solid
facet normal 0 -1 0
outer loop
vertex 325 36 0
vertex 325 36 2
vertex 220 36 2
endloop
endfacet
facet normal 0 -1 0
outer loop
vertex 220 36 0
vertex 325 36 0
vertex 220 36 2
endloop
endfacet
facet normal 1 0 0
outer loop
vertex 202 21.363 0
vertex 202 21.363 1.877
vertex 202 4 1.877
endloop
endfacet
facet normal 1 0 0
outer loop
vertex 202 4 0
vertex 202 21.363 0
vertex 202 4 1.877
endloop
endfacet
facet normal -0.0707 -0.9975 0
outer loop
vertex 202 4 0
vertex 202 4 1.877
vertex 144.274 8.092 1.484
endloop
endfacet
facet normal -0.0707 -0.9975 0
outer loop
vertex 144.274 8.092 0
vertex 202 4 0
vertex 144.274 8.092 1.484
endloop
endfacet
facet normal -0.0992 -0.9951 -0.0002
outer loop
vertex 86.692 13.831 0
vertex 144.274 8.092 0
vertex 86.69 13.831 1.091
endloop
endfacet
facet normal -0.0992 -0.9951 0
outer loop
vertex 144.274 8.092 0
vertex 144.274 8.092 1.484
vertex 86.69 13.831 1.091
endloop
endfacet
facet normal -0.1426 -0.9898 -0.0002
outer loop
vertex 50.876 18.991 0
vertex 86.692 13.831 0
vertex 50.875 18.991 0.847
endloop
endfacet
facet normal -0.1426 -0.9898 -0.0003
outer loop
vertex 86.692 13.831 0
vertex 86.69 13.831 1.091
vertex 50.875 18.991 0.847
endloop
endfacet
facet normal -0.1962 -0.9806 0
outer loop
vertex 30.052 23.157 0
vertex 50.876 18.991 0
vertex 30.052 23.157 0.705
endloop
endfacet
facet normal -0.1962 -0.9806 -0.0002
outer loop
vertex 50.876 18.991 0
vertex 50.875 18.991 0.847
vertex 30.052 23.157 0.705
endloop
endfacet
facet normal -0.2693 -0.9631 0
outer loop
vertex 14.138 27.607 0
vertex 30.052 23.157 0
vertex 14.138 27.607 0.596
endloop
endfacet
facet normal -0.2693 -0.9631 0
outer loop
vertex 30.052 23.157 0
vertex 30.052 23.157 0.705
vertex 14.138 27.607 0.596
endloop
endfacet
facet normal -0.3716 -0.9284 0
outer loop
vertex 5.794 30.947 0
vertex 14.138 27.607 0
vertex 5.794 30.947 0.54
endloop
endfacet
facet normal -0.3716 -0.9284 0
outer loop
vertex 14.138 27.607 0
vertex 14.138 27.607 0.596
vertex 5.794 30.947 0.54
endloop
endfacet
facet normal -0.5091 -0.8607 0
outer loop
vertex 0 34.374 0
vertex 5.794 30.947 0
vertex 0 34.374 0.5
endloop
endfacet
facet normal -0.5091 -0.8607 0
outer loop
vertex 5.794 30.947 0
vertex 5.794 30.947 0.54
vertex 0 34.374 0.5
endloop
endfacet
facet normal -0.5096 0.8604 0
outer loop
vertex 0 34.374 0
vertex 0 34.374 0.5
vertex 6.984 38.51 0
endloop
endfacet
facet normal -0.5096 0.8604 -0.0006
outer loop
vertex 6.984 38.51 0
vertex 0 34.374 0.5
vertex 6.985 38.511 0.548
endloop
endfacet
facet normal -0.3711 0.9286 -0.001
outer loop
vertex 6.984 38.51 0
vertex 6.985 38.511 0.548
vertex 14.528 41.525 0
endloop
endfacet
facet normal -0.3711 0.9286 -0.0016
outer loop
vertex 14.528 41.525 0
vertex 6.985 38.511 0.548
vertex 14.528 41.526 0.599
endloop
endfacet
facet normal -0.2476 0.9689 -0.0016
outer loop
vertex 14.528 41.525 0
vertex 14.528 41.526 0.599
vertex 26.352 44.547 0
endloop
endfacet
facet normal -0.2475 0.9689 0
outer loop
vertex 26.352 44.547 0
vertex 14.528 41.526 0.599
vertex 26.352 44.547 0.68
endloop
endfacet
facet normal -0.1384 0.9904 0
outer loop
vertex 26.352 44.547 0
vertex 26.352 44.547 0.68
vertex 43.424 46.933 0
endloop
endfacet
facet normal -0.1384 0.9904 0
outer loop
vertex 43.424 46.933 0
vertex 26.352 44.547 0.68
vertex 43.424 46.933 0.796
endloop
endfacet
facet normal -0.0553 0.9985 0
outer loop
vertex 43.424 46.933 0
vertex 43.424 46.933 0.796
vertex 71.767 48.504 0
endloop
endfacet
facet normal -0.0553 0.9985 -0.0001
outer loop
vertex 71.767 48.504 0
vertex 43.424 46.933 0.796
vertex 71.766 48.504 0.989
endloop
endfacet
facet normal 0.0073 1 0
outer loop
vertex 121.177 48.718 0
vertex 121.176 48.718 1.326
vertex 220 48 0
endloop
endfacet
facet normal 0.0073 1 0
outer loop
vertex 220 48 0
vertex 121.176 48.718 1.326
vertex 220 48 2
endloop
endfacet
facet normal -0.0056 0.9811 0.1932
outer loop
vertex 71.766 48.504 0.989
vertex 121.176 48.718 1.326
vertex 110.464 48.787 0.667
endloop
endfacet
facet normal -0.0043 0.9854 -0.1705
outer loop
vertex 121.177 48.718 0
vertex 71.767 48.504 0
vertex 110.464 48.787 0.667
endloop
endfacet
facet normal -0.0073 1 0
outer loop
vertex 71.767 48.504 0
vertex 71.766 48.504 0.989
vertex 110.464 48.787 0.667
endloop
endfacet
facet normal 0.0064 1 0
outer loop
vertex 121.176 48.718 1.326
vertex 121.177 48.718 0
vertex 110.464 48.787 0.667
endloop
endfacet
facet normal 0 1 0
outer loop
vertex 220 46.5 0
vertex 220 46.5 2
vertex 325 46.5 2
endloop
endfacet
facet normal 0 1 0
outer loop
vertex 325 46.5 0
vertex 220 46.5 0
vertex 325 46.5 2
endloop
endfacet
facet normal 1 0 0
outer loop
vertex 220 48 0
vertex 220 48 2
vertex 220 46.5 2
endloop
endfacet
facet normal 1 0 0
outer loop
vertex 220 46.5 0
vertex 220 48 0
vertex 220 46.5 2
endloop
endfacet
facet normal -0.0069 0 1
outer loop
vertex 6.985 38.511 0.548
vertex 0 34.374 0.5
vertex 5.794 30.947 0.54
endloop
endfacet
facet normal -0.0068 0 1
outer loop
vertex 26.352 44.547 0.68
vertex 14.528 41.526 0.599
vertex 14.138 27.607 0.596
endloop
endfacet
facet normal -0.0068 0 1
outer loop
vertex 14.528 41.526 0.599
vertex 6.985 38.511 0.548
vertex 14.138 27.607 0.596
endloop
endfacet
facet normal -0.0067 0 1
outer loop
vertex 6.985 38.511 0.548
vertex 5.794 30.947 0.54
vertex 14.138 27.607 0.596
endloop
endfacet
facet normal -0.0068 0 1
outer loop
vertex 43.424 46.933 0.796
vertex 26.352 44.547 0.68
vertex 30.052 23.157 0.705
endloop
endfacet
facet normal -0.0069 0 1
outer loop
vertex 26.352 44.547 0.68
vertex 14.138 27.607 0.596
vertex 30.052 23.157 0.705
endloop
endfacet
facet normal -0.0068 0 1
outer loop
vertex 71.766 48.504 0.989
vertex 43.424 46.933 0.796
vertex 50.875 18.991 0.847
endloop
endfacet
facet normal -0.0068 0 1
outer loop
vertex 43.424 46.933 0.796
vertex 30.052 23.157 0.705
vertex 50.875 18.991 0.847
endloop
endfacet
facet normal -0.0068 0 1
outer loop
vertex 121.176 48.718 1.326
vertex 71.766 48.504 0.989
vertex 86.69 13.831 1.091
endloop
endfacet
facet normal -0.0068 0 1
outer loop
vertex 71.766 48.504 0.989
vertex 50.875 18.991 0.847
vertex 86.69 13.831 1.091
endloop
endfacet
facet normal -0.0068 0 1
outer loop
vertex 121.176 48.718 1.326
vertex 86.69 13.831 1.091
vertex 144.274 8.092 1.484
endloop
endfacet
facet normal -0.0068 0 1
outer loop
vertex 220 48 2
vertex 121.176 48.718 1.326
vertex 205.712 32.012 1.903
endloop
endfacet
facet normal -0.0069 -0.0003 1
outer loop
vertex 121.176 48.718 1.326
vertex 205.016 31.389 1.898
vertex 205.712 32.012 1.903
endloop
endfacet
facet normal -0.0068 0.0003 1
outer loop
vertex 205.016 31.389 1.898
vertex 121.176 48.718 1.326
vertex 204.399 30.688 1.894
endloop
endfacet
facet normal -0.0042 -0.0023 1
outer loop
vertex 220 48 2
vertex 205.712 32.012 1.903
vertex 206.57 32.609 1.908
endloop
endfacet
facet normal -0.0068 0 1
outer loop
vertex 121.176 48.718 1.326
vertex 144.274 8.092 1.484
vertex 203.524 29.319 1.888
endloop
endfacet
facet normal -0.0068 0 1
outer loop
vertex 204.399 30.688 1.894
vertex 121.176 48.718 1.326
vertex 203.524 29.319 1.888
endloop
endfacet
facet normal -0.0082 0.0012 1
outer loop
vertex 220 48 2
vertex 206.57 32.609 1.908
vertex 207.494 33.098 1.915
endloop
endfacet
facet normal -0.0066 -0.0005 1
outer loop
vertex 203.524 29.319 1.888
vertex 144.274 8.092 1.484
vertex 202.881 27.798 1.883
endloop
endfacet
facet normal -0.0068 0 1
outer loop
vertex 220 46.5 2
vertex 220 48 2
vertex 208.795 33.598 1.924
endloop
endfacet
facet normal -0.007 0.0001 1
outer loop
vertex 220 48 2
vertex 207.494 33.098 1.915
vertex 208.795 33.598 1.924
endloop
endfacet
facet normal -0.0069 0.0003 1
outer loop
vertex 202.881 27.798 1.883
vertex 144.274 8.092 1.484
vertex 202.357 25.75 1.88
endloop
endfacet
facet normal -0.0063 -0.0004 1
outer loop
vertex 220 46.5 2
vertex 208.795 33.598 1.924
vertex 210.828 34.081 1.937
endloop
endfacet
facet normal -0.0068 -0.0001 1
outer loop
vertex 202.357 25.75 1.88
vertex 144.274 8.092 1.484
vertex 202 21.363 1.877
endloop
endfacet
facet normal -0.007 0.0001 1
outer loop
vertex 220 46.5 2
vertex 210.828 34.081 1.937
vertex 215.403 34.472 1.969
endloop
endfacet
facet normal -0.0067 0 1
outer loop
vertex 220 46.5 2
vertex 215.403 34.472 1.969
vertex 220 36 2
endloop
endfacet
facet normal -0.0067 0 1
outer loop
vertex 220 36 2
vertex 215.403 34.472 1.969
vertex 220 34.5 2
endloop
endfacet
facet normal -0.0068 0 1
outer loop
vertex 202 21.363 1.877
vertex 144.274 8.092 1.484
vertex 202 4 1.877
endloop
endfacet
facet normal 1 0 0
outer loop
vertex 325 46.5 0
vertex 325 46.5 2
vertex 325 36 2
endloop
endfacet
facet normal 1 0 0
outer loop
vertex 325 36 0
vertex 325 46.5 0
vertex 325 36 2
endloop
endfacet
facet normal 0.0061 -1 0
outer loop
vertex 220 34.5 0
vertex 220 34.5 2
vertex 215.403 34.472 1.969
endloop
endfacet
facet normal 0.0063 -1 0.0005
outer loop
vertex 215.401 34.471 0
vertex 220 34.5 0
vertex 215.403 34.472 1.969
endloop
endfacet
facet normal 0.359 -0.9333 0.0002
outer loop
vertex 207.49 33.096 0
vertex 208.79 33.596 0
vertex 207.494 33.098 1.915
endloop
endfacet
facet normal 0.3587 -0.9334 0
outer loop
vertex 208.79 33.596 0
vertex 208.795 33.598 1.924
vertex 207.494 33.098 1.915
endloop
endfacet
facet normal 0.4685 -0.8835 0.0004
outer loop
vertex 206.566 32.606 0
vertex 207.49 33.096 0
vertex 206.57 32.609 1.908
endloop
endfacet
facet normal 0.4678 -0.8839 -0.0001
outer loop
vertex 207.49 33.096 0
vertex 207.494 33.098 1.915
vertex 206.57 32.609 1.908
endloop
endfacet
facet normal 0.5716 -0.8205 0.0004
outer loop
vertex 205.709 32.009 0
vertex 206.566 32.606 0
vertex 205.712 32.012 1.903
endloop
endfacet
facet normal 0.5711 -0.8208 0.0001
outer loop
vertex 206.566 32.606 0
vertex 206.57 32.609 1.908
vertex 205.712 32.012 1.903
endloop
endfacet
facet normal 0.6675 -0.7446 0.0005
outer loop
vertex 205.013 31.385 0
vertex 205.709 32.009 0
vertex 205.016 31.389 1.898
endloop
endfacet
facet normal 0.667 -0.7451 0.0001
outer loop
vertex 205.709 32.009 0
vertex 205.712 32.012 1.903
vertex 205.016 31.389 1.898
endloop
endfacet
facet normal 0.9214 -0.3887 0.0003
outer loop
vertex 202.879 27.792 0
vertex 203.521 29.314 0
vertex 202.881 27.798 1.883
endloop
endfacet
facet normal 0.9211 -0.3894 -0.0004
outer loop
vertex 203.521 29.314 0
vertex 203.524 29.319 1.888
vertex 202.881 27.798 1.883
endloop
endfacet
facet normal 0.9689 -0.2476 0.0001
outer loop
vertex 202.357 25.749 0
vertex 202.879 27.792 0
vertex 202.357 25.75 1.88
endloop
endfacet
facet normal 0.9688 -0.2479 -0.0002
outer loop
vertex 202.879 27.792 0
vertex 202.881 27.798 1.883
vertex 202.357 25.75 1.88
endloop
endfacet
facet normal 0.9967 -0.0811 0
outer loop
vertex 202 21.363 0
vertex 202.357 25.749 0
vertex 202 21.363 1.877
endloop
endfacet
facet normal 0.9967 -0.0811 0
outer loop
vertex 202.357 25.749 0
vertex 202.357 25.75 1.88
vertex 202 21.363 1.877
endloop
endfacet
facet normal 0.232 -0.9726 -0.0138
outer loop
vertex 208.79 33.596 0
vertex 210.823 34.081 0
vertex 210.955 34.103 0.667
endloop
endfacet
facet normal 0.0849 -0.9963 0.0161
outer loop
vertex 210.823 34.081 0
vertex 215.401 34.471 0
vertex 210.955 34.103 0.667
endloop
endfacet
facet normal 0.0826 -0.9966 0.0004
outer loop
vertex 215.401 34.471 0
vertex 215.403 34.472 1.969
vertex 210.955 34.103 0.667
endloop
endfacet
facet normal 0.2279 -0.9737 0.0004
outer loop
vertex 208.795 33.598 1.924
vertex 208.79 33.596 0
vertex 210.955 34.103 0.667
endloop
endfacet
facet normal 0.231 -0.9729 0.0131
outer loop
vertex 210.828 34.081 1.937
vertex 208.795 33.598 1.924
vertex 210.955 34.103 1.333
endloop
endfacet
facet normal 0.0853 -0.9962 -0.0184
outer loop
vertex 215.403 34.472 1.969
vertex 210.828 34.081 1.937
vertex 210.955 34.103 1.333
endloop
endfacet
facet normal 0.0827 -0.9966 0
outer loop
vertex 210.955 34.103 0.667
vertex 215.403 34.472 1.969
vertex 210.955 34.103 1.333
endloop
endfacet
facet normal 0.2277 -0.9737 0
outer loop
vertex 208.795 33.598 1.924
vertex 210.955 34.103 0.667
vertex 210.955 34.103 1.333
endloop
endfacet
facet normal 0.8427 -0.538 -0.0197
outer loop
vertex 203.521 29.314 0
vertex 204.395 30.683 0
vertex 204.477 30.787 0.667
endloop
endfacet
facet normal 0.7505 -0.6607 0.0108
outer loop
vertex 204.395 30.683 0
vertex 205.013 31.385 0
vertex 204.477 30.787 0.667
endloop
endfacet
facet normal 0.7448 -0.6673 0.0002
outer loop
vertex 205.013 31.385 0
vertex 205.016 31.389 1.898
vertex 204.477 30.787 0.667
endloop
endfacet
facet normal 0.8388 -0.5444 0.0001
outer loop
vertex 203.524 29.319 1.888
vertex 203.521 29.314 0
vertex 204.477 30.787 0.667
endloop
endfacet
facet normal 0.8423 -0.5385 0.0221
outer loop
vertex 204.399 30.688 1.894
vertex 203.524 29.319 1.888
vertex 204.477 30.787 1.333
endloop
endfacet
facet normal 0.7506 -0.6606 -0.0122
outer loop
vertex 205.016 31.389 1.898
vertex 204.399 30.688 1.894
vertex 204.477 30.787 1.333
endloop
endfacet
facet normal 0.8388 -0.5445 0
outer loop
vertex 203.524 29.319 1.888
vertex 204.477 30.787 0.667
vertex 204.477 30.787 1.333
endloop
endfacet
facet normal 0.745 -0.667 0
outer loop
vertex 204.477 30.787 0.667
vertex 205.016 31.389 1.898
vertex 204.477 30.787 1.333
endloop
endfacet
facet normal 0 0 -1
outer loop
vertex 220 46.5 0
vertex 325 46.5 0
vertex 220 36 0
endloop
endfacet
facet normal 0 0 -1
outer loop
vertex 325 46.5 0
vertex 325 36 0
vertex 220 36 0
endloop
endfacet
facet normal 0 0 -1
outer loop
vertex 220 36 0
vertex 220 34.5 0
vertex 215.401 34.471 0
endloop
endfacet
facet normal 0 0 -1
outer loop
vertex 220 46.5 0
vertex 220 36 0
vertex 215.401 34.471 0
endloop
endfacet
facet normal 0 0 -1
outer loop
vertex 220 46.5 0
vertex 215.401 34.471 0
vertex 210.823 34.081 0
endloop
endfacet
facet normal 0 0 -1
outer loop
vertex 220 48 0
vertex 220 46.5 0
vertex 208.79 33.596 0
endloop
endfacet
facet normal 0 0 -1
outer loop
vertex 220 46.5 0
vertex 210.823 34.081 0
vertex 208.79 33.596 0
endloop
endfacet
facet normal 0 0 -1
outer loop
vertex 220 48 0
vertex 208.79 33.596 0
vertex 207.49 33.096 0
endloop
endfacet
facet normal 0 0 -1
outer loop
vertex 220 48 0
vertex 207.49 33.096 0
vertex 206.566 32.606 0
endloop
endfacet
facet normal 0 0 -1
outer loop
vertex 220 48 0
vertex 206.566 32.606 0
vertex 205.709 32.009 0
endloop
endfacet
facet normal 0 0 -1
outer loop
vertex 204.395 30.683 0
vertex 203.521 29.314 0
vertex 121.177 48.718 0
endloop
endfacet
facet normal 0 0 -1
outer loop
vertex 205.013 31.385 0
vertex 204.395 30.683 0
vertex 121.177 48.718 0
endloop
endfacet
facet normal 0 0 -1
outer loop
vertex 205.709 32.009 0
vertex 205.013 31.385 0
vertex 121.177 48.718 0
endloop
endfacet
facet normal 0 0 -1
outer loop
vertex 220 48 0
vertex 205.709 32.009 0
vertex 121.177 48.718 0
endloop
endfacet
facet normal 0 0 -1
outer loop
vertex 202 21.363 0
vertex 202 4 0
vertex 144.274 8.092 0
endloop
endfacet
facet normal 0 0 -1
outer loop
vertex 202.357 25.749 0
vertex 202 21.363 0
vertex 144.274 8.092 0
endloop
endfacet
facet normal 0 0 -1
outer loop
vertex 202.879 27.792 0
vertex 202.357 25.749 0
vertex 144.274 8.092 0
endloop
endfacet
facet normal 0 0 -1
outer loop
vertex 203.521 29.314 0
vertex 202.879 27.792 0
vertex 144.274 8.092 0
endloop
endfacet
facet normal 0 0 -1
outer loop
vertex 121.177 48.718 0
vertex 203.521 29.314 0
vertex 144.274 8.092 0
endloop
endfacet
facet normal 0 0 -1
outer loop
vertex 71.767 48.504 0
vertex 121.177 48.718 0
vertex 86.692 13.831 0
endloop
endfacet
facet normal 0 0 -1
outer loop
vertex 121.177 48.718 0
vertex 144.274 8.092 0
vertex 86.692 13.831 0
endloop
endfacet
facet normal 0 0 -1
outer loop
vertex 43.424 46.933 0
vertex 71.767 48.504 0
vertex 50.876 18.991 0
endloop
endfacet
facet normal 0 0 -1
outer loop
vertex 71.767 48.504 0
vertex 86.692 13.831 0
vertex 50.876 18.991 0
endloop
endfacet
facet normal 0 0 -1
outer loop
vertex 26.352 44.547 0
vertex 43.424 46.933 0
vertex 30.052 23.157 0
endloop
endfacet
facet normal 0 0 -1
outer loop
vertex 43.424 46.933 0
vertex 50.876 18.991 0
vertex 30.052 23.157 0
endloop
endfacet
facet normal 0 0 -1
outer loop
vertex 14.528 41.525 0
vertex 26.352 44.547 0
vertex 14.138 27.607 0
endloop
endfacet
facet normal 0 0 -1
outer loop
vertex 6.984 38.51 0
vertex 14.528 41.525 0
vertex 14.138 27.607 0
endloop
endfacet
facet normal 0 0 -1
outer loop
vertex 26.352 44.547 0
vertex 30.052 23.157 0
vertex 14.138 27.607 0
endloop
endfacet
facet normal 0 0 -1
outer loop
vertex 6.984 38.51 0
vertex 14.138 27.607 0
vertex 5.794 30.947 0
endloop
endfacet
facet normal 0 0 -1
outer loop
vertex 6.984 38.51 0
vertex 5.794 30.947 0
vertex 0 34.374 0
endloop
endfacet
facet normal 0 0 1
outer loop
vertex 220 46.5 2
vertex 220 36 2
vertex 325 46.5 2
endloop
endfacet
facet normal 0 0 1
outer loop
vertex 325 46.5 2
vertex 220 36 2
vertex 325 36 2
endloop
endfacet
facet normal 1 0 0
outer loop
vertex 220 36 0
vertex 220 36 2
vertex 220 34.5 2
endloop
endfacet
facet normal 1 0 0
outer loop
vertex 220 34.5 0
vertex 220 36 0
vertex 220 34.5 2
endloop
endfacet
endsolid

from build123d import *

# Parameters (mm, degrees)
BOSS_EXTRU_1_DEPTH      = 52
ESQUISSE4_W             = 351.485824357
ESQUISSE4_H             = 52
ENL_V_MAT_EXTRU_1_DEPTH = 52


with BuildPart() as part:
    # Esquisse3 → Boss.-Extru.1 (new body)
    with BuildSketch(Plane(origin=(0, 0, 0), x_dir=(1, 0, 0), z_dir=(0, 1, 0))):
        Polygon((341.486019825, 0), (0, 0), (-9.995686149, 0), (-9.999804532, -0.431819515), (0, -0.5), (220, -2), (341.486019825, -2), align=None)
    extrude(amount=BOSS_EXTRU_1_DEPTH)

    # Esquisse4 → Enlèv. mat.-Extru.1 (cut)
    with BuildSketch(Plane.XY.offset(2)):
        with Locations((165.743107647, 26)):
            Rectangle(ESQUISSE4_W, ESQUISSE4_H)
        with BuildLine():
            Line((325, 46.5), (325, 36))
            Line((325, 36), (220, 36))
            Line((220, 36), (220, 34.5))
            add(Edge.make_bspline(
                [(220, 34.5), (210.148627769, 34.5), (202, 34.902841403), (202, 21.363033151)],
                knots=[0, 0, 0, 0, 1, 1, 1, 1], degree=3))
            Line((202, 21.363033151), (202, 4))
            add(Edge.make_bspline(
                [(202, 4), (25.782341649, 14.763588637), (0, 34.373939813)],
                knots=[0, 0, 0, 1, 1, 1], degree=2))
            add(Edge.make_bspline(
                [(0, 34.373939813), (26.740576578, 53.810637401), (88.50602407, 48), (220, 48)],
                knots=[0, 0, 0, 0, 1, 1, 1, 1], degree=3))
            Line((220, 48), (220, 46.5))
            Line((220, 46.5), (325, 46.5))
        make_face(mode=Mode.SUBTRACT)
    extrude(amount=-ENL_V_MAT_EXTRU_1_DEPTH, mode=Mode.SUBTRACT)


solid = part.part
